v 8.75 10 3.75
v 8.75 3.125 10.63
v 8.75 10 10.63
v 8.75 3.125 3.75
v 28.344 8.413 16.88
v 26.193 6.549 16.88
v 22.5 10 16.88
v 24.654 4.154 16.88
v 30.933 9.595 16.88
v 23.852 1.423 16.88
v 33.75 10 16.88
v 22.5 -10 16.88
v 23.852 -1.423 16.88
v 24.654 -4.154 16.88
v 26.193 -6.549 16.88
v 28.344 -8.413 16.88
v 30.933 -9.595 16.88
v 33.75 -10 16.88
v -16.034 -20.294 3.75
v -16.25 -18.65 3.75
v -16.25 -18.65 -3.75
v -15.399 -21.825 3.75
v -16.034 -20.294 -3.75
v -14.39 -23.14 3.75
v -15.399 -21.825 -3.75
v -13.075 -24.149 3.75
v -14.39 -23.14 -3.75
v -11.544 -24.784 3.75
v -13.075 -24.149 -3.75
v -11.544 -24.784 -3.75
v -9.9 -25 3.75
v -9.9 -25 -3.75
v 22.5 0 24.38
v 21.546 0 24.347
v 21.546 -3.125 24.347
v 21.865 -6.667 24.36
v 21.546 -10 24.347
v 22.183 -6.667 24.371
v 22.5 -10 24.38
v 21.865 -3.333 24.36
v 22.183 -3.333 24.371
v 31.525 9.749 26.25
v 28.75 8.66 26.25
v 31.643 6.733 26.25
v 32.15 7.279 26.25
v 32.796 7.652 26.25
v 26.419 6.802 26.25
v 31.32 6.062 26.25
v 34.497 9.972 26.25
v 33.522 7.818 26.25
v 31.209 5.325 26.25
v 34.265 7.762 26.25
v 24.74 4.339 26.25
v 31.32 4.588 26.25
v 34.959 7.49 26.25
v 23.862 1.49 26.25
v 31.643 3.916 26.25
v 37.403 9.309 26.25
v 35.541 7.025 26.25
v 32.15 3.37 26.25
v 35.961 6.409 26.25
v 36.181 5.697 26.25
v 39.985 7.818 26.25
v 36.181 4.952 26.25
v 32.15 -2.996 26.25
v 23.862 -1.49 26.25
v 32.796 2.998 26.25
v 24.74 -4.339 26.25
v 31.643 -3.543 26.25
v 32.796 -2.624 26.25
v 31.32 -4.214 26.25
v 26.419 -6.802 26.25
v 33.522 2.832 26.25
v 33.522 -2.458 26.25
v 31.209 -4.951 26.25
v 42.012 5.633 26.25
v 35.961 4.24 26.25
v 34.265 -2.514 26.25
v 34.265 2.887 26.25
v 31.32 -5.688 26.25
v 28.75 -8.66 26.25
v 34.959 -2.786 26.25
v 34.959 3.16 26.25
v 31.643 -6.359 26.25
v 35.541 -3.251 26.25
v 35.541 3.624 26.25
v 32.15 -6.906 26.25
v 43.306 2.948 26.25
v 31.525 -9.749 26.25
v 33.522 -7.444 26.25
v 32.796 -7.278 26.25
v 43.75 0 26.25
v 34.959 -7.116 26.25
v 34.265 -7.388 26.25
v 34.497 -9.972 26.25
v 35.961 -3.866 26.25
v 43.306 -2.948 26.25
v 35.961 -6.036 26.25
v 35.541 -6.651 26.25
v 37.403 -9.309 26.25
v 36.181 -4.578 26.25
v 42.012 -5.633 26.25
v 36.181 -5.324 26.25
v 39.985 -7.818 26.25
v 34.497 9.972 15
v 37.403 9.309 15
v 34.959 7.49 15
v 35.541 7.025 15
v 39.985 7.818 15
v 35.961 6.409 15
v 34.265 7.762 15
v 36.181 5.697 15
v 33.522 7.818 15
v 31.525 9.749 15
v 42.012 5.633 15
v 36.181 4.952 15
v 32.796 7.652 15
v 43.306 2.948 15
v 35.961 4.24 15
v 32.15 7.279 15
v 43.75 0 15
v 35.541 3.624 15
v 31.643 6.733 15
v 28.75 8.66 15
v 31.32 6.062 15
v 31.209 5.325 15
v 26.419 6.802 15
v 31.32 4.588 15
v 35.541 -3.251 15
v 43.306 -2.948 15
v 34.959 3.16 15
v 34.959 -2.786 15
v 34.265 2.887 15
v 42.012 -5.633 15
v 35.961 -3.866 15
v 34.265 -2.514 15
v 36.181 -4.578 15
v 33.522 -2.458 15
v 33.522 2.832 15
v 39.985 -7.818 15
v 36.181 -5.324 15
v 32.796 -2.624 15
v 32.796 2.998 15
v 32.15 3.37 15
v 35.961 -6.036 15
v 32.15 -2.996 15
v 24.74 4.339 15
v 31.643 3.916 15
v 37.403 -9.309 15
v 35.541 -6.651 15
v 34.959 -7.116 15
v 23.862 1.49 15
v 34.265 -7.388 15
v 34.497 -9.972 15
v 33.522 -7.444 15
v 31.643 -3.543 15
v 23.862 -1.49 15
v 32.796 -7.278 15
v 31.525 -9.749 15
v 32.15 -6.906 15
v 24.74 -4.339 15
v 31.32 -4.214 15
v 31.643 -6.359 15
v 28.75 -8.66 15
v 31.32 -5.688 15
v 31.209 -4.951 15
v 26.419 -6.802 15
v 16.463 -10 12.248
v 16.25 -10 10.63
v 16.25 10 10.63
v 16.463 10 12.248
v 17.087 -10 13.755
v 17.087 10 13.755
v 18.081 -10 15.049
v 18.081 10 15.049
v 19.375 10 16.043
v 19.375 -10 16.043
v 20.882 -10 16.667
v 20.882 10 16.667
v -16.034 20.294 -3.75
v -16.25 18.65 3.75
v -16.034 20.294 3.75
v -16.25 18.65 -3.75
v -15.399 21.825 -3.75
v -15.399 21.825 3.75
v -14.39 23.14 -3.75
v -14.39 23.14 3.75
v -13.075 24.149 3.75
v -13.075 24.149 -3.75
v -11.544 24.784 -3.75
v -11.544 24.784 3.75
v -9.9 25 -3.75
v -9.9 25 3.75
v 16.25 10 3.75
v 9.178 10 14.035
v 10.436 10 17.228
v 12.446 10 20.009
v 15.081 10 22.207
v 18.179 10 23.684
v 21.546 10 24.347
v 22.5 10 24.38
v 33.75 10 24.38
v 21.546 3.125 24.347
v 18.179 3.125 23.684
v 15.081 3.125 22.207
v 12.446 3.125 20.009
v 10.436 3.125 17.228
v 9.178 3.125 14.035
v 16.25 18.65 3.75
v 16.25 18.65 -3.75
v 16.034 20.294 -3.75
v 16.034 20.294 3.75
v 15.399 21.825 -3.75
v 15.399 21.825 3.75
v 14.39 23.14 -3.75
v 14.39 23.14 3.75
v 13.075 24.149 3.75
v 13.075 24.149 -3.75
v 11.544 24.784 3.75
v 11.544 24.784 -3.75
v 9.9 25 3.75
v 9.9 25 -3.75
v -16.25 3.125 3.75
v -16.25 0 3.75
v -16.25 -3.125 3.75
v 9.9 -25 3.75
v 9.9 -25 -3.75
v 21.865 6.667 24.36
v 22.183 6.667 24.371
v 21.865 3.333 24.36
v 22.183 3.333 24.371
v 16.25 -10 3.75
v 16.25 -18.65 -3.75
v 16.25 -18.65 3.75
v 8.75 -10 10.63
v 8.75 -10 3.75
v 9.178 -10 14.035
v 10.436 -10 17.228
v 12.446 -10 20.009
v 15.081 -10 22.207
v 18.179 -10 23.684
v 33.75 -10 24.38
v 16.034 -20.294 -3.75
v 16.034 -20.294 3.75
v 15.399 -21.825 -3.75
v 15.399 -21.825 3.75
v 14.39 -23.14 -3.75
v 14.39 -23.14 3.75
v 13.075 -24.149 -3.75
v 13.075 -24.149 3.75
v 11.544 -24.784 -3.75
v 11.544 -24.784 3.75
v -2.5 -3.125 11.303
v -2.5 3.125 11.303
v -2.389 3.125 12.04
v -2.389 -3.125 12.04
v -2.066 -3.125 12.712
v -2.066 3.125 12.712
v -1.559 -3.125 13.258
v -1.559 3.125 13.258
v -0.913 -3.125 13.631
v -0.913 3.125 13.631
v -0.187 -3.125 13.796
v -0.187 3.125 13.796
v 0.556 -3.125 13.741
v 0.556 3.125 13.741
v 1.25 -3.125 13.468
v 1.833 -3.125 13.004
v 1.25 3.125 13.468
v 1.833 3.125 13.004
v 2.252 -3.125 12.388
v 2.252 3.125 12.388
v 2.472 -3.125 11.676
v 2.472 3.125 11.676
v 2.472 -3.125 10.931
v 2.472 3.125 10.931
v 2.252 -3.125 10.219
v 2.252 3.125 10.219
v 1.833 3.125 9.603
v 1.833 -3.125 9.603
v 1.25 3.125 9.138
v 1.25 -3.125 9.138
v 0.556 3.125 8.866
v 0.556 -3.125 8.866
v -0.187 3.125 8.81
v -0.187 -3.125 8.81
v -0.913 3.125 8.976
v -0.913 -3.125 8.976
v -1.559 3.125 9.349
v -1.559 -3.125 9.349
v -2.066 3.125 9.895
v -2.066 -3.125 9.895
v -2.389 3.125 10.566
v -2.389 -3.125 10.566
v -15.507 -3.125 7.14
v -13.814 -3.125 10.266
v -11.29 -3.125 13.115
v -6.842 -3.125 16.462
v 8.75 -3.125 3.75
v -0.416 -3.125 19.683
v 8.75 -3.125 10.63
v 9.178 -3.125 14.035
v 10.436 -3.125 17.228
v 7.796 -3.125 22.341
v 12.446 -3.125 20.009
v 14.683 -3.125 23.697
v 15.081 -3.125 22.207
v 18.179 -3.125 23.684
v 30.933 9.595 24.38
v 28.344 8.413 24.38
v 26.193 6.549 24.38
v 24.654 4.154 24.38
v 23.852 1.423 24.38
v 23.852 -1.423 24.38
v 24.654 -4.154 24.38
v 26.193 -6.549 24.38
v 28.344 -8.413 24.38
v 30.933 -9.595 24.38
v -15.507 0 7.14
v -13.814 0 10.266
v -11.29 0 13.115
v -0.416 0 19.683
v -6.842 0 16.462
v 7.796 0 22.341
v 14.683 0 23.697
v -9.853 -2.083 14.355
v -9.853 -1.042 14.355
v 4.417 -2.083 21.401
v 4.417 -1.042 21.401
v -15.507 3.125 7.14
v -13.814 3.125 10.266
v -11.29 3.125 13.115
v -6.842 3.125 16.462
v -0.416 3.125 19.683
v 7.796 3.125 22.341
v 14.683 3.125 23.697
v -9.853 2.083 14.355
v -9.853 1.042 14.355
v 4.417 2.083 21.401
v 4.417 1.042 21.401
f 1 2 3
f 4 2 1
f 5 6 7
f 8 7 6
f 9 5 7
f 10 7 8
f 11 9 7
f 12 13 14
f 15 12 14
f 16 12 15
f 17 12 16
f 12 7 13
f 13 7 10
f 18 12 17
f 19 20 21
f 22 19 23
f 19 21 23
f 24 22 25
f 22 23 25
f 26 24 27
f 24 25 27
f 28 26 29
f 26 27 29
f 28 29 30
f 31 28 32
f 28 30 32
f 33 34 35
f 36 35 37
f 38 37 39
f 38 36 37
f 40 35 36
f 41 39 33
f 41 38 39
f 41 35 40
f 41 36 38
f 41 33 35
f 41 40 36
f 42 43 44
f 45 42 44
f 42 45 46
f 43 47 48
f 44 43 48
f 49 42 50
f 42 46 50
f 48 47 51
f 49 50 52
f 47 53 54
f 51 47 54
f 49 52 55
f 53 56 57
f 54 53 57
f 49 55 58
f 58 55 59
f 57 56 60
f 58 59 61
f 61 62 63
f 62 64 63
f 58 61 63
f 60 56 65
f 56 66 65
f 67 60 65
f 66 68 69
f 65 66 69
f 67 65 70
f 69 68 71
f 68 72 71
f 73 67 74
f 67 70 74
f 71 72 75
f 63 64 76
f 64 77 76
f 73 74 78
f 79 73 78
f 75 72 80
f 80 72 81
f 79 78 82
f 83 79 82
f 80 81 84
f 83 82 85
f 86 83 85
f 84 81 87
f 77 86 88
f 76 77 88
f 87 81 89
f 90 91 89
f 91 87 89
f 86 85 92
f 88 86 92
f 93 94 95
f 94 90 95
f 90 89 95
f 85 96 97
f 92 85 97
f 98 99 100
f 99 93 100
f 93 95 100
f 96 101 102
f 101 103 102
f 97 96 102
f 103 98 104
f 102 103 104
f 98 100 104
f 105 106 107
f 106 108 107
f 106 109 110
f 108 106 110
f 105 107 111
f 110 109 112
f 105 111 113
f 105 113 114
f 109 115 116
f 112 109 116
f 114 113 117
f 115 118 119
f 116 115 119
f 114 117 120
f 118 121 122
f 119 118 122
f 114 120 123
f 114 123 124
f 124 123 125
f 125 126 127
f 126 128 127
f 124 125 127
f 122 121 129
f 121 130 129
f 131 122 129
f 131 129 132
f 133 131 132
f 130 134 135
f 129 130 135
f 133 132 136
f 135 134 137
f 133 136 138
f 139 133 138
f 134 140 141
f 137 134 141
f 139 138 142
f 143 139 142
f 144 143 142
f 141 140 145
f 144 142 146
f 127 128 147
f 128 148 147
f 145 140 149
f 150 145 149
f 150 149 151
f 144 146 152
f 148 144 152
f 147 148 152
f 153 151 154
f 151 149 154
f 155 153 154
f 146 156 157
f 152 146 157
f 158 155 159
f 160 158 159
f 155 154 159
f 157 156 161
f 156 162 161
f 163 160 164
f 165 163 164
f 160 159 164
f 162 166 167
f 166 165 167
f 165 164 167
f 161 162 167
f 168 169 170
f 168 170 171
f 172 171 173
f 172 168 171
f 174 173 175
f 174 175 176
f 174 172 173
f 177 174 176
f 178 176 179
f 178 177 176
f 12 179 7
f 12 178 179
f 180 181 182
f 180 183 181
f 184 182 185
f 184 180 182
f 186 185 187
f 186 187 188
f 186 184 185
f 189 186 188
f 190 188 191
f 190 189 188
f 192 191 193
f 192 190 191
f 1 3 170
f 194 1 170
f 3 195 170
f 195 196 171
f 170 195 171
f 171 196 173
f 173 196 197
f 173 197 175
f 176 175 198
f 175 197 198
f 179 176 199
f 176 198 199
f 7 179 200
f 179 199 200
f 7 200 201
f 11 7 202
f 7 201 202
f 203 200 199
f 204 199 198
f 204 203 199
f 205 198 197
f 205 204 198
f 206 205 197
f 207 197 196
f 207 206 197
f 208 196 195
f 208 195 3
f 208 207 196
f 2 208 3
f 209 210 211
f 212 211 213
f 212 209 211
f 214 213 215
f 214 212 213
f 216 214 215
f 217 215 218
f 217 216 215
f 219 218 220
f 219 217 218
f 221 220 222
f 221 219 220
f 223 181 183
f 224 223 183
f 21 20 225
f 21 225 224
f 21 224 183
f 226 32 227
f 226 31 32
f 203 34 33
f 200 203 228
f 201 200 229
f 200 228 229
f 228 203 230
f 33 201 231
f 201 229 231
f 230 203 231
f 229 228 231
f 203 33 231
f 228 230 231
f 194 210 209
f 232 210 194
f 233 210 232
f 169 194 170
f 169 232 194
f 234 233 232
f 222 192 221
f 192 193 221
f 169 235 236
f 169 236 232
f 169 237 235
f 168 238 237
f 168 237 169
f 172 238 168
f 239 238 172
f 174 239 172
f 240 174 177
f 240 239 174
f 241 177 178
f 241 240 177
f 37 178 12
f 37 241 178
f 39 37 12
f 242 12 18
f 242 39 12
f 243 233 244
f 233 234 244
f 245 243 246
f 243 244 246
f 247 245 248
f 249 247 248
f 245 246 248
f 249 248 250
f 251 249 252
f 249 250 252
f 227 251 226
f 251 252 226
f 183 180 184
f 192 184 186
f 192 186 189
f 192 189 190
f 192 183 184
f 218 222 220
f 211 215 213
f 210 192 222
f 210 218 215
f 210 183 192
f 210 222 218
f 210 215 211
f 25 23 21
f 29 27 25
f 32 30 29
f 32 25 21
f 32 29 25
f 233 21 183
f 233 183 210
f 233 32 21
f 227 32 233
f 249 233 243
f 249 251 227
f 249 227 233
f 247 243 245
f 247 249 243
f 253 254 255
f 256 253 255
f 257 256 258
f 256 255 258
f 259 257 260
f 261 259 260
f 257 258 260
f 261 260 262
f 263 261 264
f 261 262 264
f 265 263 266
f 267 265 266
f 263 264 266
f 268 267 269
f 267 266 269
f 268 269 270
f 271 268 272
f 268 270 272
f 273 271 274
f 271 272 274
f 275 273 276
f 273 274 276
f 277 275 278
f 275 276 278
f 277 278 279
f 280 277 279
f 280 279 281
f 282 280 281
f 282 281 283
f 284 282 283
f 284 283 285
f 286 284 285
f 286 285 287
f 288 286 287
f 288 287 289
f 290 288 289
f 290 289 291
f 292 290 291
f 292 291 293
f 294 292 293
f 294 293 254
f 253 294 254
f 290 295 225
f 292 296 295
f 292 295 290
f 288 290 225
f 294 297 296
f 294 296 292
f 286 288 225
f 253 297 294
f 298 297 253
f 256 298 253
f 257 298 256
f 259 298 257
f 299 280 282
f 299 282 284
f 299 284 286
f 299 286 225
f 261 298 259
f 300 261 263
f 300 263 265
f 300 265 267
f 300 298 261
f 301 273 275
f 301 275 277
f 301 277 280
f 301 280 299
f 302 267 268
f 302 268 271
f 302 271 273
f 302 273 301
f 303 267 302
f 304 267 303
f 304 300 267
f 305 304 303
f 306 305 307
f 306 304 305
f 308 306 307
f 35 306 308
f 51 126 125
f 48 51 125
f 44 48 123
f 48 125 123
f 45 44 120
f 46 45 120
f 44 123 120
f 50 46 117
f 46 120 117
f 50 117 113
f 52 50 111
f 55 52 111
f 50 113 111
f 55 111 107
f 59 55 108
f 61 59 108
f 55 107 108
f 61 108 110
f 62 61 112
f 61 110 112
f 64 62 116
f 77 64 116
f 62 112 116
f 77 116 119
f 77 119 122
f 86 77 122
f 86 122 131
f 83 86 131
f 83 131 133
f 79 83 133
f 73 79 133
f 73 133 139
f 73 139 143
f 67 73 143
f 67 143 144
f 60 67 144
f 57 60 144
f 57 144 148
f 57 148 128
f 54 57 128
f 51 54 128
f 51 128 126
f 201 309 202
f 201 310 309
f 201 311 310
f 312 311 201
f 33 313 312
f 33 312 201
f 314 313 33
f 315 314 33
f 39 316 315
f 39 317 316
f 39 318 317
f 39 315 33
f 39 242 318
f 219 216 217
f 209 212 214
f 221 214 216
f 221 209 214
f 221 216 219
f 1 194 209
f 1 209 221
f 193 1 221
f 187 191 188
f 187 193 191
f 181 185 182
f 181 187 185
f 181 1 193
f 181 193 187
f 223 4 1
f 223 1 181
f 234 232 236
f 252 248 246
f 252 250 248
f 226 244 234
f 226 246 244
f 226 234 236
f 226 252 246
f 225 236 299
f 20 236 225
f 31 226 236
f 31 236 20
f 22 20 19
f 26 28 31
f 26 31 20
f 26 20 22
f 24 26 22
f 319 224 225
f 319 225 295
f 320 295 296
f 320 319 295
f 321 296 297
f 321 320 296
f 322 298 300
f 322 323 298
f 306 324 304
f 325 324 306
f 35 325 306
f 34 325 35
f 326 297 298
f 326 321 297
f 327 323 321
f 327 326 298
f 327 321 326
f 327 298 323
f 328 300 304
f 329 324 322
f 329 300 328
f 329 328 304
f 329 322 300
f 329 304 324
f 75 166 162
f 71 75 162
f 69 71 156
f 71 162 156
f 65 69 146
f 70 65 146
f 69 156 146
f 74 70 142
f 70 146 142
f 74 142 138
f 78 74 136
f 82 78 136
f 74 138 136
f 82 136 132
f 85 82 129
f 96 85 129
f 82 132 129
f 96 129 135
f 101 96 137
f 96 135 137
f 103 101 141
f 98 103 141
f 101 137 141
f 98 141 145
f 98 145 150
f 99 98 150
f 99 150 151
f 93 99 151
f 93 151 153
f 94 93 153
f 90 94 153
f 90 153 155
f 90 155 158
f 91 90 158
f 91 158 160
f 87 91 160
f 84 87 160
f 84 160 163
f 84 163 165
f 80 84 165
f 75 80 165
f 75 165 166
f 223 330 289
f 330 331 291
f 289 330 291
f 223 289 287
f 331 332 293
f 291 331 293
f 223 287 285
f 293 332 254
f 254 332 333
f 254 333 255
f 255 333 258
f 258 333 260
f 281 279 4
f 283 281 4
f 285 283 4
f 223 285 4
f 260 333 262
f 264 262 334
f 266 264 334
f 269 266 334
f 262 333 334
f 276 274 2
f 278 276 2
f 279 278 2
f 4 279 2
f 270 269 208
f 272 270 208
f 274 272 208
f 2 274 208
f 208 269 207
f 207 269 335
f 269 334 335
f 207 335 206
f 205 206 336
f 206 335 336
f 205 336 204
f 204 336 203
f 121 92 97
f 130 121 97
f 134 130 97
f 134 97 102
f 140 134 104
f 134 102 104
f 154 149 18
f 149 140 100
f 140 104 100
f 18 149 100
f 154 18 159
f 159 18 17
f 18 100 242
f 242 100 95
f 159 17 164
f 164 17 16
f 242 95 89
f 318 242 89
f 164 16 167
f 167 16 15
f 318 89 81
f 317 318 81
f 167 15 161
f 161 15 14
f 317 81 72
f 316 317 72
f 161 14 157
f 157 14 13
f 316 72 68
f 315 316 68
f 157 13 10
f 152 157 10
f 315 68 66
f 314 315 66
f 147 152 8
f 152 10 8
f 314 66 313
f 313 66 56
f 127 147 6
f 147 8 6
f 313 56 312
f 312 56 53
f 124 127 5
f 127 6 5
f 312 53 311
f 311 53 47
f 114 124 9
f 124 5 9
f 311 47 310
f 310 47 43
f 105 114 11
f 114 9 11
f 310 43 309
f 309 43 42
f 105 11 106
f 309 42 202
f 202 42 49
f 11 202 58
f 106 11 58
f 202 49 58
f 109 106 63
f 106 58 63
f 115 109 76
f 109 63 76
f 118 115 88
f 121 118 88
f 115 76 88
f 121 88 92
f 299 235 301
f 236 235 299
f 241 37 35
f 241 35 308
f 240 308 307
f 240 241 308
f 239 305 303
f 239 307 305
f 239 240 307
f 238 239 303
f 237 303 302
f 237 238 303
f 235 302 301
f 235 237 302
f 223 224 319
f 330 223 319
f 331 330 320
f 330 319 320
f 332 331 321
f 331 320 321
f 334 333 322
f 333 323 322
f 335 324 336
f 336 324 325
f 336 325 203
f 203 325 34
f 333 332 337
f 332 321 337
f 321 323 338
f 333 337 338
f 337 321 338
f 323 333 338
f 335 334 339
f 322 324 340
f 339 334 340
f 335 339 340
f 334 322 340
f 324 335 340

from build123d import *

# Parameters (mm, degrees)
F1_DEPTH = 25
F0_W     = 10
F0_H     = 7.5
F2_DEPTH = 10
F3_DEPTH = 3.125
F5_R     = 6.35
F7_D     = 5
F9_D     = 5


with BuildPart() as f1:
    # F0 (on Front) → F1 (new body, symmetric)
    with BuildSketch(Plane.XZ):
        Polygon((8.75, 3.75), (-16.25, 3.75), (-16.25, -3.75), (16.25, -3.75), (16.25, 3.75), align=None)
    extrude(amount=F1_DEPTH, both=True)

    # F0 (on Front) → F2 (join, symmetric)
    with BuildSketch(Plane.XZ):
        with BuildLine():
            Line((8.75, 10.63), (8.75, 3.75))
            Line((8.75, 3.75), (16.25, 3.75))
            Line((16.25, 3.75), (16.25, 10.63))
            ThreePointArc((16.25, 10.63), (18.0805826176, 15.0494173824), (22.5, 16.88))
            Line((22.5, 16.88), (23.75, 16.88))
            Line((23.75, 16.88), (23.75, 24.38))
            Line((23.75, 24.38), (22.5, 24.38))
            add(Edge.make_bspline(
                [(21.5462434262, 24.3468818759), (21.8653666282, 24.3604124593), (22.1833362267, 24.3714573104), (22.5, 24.38)],
                knots=[43.0852558218, 43.0852558218, 43.0852558218, 43.0852558218, 43.8994236864, 43.8994236864, 43.8994236864, 43.8994236864], degree=3))
            ThreePointArc((21.5462434262, 24.3468818759), (12.4457309343, 20.0094548645), (8.75, 10.63))
        make_face()
        with Locations((28.75, 20.63)):
            Rectangle(F0_W, F0_H)
    extrude(amount=F2_DEPTH, both=True)

    # F0 (on Front) → F3 (join, symmetric)
    with BuildSketch(Plane.XZ):
        Polygon((8.75, 3.75), (-16.25, 3.75), (-16.25, -3.75), (16.25, -3.75), (16.25, 3.75), align=None)
        with BuildLine():
            add(Edge.make_bspline(
                [(-16.25, 3.75), (-15.4599795395, 15.953627077), (4.6584425259, 23.6308518407), (21.5462434262, 24.3468818759)],
                knots=[0, 0, 0, 0, 43.0852558218, 43.0852558218, 43.0852558218, 43.0852558218], degree=3))
            Line((-16.25, 3.75), (8.75, 3.75))
            Line((8.75, 3.75), (8.75, 10.63))
            ThreePointArc((8.75, 10.63), (12.4457309343, 20.0094548645), (21.5462434262, 24.3468818759))
        make_face()
    extrude(amount=F3_DEPTH, both=True)

    # F0 (on Front) → F4 (revolve)
    with BuildSketch(Plane.XZ):
        Polygon((33.75, 26.25), (33.75, 24.38), (33.75, 16.88), (33.75, 15), (43.75, 15), (43.75, 26.25), align=None)
    revolve(axis=Axis((33.75, 0, 20.625), (0, 0, -1)))

    # F5
    f5_edges = [f1.edges().sort_by_distance(p)[0] for p in [
        (-16.25, -25, 0),
        (16.25, -25, 0),
        (16.25, 25, 0),
        (-16.25, 25, 0),
    ]]
    fillet(f5_edges, radius=F5_R)

    # F7 (through all)
    with Locations(Plane.XY.offset(26.25)):
        with Locations((33.7088629603, 5.3247334436), (33.7088629603, -4.9510677345)):
            Hole(F7_D / 2)

    # F9 (through all)
    with Locations(Plane.XZ.offset(3.125)):
        with Locations((0, 11.303381063)):
            Hole(F9_D / 2)


solid = f1.part
